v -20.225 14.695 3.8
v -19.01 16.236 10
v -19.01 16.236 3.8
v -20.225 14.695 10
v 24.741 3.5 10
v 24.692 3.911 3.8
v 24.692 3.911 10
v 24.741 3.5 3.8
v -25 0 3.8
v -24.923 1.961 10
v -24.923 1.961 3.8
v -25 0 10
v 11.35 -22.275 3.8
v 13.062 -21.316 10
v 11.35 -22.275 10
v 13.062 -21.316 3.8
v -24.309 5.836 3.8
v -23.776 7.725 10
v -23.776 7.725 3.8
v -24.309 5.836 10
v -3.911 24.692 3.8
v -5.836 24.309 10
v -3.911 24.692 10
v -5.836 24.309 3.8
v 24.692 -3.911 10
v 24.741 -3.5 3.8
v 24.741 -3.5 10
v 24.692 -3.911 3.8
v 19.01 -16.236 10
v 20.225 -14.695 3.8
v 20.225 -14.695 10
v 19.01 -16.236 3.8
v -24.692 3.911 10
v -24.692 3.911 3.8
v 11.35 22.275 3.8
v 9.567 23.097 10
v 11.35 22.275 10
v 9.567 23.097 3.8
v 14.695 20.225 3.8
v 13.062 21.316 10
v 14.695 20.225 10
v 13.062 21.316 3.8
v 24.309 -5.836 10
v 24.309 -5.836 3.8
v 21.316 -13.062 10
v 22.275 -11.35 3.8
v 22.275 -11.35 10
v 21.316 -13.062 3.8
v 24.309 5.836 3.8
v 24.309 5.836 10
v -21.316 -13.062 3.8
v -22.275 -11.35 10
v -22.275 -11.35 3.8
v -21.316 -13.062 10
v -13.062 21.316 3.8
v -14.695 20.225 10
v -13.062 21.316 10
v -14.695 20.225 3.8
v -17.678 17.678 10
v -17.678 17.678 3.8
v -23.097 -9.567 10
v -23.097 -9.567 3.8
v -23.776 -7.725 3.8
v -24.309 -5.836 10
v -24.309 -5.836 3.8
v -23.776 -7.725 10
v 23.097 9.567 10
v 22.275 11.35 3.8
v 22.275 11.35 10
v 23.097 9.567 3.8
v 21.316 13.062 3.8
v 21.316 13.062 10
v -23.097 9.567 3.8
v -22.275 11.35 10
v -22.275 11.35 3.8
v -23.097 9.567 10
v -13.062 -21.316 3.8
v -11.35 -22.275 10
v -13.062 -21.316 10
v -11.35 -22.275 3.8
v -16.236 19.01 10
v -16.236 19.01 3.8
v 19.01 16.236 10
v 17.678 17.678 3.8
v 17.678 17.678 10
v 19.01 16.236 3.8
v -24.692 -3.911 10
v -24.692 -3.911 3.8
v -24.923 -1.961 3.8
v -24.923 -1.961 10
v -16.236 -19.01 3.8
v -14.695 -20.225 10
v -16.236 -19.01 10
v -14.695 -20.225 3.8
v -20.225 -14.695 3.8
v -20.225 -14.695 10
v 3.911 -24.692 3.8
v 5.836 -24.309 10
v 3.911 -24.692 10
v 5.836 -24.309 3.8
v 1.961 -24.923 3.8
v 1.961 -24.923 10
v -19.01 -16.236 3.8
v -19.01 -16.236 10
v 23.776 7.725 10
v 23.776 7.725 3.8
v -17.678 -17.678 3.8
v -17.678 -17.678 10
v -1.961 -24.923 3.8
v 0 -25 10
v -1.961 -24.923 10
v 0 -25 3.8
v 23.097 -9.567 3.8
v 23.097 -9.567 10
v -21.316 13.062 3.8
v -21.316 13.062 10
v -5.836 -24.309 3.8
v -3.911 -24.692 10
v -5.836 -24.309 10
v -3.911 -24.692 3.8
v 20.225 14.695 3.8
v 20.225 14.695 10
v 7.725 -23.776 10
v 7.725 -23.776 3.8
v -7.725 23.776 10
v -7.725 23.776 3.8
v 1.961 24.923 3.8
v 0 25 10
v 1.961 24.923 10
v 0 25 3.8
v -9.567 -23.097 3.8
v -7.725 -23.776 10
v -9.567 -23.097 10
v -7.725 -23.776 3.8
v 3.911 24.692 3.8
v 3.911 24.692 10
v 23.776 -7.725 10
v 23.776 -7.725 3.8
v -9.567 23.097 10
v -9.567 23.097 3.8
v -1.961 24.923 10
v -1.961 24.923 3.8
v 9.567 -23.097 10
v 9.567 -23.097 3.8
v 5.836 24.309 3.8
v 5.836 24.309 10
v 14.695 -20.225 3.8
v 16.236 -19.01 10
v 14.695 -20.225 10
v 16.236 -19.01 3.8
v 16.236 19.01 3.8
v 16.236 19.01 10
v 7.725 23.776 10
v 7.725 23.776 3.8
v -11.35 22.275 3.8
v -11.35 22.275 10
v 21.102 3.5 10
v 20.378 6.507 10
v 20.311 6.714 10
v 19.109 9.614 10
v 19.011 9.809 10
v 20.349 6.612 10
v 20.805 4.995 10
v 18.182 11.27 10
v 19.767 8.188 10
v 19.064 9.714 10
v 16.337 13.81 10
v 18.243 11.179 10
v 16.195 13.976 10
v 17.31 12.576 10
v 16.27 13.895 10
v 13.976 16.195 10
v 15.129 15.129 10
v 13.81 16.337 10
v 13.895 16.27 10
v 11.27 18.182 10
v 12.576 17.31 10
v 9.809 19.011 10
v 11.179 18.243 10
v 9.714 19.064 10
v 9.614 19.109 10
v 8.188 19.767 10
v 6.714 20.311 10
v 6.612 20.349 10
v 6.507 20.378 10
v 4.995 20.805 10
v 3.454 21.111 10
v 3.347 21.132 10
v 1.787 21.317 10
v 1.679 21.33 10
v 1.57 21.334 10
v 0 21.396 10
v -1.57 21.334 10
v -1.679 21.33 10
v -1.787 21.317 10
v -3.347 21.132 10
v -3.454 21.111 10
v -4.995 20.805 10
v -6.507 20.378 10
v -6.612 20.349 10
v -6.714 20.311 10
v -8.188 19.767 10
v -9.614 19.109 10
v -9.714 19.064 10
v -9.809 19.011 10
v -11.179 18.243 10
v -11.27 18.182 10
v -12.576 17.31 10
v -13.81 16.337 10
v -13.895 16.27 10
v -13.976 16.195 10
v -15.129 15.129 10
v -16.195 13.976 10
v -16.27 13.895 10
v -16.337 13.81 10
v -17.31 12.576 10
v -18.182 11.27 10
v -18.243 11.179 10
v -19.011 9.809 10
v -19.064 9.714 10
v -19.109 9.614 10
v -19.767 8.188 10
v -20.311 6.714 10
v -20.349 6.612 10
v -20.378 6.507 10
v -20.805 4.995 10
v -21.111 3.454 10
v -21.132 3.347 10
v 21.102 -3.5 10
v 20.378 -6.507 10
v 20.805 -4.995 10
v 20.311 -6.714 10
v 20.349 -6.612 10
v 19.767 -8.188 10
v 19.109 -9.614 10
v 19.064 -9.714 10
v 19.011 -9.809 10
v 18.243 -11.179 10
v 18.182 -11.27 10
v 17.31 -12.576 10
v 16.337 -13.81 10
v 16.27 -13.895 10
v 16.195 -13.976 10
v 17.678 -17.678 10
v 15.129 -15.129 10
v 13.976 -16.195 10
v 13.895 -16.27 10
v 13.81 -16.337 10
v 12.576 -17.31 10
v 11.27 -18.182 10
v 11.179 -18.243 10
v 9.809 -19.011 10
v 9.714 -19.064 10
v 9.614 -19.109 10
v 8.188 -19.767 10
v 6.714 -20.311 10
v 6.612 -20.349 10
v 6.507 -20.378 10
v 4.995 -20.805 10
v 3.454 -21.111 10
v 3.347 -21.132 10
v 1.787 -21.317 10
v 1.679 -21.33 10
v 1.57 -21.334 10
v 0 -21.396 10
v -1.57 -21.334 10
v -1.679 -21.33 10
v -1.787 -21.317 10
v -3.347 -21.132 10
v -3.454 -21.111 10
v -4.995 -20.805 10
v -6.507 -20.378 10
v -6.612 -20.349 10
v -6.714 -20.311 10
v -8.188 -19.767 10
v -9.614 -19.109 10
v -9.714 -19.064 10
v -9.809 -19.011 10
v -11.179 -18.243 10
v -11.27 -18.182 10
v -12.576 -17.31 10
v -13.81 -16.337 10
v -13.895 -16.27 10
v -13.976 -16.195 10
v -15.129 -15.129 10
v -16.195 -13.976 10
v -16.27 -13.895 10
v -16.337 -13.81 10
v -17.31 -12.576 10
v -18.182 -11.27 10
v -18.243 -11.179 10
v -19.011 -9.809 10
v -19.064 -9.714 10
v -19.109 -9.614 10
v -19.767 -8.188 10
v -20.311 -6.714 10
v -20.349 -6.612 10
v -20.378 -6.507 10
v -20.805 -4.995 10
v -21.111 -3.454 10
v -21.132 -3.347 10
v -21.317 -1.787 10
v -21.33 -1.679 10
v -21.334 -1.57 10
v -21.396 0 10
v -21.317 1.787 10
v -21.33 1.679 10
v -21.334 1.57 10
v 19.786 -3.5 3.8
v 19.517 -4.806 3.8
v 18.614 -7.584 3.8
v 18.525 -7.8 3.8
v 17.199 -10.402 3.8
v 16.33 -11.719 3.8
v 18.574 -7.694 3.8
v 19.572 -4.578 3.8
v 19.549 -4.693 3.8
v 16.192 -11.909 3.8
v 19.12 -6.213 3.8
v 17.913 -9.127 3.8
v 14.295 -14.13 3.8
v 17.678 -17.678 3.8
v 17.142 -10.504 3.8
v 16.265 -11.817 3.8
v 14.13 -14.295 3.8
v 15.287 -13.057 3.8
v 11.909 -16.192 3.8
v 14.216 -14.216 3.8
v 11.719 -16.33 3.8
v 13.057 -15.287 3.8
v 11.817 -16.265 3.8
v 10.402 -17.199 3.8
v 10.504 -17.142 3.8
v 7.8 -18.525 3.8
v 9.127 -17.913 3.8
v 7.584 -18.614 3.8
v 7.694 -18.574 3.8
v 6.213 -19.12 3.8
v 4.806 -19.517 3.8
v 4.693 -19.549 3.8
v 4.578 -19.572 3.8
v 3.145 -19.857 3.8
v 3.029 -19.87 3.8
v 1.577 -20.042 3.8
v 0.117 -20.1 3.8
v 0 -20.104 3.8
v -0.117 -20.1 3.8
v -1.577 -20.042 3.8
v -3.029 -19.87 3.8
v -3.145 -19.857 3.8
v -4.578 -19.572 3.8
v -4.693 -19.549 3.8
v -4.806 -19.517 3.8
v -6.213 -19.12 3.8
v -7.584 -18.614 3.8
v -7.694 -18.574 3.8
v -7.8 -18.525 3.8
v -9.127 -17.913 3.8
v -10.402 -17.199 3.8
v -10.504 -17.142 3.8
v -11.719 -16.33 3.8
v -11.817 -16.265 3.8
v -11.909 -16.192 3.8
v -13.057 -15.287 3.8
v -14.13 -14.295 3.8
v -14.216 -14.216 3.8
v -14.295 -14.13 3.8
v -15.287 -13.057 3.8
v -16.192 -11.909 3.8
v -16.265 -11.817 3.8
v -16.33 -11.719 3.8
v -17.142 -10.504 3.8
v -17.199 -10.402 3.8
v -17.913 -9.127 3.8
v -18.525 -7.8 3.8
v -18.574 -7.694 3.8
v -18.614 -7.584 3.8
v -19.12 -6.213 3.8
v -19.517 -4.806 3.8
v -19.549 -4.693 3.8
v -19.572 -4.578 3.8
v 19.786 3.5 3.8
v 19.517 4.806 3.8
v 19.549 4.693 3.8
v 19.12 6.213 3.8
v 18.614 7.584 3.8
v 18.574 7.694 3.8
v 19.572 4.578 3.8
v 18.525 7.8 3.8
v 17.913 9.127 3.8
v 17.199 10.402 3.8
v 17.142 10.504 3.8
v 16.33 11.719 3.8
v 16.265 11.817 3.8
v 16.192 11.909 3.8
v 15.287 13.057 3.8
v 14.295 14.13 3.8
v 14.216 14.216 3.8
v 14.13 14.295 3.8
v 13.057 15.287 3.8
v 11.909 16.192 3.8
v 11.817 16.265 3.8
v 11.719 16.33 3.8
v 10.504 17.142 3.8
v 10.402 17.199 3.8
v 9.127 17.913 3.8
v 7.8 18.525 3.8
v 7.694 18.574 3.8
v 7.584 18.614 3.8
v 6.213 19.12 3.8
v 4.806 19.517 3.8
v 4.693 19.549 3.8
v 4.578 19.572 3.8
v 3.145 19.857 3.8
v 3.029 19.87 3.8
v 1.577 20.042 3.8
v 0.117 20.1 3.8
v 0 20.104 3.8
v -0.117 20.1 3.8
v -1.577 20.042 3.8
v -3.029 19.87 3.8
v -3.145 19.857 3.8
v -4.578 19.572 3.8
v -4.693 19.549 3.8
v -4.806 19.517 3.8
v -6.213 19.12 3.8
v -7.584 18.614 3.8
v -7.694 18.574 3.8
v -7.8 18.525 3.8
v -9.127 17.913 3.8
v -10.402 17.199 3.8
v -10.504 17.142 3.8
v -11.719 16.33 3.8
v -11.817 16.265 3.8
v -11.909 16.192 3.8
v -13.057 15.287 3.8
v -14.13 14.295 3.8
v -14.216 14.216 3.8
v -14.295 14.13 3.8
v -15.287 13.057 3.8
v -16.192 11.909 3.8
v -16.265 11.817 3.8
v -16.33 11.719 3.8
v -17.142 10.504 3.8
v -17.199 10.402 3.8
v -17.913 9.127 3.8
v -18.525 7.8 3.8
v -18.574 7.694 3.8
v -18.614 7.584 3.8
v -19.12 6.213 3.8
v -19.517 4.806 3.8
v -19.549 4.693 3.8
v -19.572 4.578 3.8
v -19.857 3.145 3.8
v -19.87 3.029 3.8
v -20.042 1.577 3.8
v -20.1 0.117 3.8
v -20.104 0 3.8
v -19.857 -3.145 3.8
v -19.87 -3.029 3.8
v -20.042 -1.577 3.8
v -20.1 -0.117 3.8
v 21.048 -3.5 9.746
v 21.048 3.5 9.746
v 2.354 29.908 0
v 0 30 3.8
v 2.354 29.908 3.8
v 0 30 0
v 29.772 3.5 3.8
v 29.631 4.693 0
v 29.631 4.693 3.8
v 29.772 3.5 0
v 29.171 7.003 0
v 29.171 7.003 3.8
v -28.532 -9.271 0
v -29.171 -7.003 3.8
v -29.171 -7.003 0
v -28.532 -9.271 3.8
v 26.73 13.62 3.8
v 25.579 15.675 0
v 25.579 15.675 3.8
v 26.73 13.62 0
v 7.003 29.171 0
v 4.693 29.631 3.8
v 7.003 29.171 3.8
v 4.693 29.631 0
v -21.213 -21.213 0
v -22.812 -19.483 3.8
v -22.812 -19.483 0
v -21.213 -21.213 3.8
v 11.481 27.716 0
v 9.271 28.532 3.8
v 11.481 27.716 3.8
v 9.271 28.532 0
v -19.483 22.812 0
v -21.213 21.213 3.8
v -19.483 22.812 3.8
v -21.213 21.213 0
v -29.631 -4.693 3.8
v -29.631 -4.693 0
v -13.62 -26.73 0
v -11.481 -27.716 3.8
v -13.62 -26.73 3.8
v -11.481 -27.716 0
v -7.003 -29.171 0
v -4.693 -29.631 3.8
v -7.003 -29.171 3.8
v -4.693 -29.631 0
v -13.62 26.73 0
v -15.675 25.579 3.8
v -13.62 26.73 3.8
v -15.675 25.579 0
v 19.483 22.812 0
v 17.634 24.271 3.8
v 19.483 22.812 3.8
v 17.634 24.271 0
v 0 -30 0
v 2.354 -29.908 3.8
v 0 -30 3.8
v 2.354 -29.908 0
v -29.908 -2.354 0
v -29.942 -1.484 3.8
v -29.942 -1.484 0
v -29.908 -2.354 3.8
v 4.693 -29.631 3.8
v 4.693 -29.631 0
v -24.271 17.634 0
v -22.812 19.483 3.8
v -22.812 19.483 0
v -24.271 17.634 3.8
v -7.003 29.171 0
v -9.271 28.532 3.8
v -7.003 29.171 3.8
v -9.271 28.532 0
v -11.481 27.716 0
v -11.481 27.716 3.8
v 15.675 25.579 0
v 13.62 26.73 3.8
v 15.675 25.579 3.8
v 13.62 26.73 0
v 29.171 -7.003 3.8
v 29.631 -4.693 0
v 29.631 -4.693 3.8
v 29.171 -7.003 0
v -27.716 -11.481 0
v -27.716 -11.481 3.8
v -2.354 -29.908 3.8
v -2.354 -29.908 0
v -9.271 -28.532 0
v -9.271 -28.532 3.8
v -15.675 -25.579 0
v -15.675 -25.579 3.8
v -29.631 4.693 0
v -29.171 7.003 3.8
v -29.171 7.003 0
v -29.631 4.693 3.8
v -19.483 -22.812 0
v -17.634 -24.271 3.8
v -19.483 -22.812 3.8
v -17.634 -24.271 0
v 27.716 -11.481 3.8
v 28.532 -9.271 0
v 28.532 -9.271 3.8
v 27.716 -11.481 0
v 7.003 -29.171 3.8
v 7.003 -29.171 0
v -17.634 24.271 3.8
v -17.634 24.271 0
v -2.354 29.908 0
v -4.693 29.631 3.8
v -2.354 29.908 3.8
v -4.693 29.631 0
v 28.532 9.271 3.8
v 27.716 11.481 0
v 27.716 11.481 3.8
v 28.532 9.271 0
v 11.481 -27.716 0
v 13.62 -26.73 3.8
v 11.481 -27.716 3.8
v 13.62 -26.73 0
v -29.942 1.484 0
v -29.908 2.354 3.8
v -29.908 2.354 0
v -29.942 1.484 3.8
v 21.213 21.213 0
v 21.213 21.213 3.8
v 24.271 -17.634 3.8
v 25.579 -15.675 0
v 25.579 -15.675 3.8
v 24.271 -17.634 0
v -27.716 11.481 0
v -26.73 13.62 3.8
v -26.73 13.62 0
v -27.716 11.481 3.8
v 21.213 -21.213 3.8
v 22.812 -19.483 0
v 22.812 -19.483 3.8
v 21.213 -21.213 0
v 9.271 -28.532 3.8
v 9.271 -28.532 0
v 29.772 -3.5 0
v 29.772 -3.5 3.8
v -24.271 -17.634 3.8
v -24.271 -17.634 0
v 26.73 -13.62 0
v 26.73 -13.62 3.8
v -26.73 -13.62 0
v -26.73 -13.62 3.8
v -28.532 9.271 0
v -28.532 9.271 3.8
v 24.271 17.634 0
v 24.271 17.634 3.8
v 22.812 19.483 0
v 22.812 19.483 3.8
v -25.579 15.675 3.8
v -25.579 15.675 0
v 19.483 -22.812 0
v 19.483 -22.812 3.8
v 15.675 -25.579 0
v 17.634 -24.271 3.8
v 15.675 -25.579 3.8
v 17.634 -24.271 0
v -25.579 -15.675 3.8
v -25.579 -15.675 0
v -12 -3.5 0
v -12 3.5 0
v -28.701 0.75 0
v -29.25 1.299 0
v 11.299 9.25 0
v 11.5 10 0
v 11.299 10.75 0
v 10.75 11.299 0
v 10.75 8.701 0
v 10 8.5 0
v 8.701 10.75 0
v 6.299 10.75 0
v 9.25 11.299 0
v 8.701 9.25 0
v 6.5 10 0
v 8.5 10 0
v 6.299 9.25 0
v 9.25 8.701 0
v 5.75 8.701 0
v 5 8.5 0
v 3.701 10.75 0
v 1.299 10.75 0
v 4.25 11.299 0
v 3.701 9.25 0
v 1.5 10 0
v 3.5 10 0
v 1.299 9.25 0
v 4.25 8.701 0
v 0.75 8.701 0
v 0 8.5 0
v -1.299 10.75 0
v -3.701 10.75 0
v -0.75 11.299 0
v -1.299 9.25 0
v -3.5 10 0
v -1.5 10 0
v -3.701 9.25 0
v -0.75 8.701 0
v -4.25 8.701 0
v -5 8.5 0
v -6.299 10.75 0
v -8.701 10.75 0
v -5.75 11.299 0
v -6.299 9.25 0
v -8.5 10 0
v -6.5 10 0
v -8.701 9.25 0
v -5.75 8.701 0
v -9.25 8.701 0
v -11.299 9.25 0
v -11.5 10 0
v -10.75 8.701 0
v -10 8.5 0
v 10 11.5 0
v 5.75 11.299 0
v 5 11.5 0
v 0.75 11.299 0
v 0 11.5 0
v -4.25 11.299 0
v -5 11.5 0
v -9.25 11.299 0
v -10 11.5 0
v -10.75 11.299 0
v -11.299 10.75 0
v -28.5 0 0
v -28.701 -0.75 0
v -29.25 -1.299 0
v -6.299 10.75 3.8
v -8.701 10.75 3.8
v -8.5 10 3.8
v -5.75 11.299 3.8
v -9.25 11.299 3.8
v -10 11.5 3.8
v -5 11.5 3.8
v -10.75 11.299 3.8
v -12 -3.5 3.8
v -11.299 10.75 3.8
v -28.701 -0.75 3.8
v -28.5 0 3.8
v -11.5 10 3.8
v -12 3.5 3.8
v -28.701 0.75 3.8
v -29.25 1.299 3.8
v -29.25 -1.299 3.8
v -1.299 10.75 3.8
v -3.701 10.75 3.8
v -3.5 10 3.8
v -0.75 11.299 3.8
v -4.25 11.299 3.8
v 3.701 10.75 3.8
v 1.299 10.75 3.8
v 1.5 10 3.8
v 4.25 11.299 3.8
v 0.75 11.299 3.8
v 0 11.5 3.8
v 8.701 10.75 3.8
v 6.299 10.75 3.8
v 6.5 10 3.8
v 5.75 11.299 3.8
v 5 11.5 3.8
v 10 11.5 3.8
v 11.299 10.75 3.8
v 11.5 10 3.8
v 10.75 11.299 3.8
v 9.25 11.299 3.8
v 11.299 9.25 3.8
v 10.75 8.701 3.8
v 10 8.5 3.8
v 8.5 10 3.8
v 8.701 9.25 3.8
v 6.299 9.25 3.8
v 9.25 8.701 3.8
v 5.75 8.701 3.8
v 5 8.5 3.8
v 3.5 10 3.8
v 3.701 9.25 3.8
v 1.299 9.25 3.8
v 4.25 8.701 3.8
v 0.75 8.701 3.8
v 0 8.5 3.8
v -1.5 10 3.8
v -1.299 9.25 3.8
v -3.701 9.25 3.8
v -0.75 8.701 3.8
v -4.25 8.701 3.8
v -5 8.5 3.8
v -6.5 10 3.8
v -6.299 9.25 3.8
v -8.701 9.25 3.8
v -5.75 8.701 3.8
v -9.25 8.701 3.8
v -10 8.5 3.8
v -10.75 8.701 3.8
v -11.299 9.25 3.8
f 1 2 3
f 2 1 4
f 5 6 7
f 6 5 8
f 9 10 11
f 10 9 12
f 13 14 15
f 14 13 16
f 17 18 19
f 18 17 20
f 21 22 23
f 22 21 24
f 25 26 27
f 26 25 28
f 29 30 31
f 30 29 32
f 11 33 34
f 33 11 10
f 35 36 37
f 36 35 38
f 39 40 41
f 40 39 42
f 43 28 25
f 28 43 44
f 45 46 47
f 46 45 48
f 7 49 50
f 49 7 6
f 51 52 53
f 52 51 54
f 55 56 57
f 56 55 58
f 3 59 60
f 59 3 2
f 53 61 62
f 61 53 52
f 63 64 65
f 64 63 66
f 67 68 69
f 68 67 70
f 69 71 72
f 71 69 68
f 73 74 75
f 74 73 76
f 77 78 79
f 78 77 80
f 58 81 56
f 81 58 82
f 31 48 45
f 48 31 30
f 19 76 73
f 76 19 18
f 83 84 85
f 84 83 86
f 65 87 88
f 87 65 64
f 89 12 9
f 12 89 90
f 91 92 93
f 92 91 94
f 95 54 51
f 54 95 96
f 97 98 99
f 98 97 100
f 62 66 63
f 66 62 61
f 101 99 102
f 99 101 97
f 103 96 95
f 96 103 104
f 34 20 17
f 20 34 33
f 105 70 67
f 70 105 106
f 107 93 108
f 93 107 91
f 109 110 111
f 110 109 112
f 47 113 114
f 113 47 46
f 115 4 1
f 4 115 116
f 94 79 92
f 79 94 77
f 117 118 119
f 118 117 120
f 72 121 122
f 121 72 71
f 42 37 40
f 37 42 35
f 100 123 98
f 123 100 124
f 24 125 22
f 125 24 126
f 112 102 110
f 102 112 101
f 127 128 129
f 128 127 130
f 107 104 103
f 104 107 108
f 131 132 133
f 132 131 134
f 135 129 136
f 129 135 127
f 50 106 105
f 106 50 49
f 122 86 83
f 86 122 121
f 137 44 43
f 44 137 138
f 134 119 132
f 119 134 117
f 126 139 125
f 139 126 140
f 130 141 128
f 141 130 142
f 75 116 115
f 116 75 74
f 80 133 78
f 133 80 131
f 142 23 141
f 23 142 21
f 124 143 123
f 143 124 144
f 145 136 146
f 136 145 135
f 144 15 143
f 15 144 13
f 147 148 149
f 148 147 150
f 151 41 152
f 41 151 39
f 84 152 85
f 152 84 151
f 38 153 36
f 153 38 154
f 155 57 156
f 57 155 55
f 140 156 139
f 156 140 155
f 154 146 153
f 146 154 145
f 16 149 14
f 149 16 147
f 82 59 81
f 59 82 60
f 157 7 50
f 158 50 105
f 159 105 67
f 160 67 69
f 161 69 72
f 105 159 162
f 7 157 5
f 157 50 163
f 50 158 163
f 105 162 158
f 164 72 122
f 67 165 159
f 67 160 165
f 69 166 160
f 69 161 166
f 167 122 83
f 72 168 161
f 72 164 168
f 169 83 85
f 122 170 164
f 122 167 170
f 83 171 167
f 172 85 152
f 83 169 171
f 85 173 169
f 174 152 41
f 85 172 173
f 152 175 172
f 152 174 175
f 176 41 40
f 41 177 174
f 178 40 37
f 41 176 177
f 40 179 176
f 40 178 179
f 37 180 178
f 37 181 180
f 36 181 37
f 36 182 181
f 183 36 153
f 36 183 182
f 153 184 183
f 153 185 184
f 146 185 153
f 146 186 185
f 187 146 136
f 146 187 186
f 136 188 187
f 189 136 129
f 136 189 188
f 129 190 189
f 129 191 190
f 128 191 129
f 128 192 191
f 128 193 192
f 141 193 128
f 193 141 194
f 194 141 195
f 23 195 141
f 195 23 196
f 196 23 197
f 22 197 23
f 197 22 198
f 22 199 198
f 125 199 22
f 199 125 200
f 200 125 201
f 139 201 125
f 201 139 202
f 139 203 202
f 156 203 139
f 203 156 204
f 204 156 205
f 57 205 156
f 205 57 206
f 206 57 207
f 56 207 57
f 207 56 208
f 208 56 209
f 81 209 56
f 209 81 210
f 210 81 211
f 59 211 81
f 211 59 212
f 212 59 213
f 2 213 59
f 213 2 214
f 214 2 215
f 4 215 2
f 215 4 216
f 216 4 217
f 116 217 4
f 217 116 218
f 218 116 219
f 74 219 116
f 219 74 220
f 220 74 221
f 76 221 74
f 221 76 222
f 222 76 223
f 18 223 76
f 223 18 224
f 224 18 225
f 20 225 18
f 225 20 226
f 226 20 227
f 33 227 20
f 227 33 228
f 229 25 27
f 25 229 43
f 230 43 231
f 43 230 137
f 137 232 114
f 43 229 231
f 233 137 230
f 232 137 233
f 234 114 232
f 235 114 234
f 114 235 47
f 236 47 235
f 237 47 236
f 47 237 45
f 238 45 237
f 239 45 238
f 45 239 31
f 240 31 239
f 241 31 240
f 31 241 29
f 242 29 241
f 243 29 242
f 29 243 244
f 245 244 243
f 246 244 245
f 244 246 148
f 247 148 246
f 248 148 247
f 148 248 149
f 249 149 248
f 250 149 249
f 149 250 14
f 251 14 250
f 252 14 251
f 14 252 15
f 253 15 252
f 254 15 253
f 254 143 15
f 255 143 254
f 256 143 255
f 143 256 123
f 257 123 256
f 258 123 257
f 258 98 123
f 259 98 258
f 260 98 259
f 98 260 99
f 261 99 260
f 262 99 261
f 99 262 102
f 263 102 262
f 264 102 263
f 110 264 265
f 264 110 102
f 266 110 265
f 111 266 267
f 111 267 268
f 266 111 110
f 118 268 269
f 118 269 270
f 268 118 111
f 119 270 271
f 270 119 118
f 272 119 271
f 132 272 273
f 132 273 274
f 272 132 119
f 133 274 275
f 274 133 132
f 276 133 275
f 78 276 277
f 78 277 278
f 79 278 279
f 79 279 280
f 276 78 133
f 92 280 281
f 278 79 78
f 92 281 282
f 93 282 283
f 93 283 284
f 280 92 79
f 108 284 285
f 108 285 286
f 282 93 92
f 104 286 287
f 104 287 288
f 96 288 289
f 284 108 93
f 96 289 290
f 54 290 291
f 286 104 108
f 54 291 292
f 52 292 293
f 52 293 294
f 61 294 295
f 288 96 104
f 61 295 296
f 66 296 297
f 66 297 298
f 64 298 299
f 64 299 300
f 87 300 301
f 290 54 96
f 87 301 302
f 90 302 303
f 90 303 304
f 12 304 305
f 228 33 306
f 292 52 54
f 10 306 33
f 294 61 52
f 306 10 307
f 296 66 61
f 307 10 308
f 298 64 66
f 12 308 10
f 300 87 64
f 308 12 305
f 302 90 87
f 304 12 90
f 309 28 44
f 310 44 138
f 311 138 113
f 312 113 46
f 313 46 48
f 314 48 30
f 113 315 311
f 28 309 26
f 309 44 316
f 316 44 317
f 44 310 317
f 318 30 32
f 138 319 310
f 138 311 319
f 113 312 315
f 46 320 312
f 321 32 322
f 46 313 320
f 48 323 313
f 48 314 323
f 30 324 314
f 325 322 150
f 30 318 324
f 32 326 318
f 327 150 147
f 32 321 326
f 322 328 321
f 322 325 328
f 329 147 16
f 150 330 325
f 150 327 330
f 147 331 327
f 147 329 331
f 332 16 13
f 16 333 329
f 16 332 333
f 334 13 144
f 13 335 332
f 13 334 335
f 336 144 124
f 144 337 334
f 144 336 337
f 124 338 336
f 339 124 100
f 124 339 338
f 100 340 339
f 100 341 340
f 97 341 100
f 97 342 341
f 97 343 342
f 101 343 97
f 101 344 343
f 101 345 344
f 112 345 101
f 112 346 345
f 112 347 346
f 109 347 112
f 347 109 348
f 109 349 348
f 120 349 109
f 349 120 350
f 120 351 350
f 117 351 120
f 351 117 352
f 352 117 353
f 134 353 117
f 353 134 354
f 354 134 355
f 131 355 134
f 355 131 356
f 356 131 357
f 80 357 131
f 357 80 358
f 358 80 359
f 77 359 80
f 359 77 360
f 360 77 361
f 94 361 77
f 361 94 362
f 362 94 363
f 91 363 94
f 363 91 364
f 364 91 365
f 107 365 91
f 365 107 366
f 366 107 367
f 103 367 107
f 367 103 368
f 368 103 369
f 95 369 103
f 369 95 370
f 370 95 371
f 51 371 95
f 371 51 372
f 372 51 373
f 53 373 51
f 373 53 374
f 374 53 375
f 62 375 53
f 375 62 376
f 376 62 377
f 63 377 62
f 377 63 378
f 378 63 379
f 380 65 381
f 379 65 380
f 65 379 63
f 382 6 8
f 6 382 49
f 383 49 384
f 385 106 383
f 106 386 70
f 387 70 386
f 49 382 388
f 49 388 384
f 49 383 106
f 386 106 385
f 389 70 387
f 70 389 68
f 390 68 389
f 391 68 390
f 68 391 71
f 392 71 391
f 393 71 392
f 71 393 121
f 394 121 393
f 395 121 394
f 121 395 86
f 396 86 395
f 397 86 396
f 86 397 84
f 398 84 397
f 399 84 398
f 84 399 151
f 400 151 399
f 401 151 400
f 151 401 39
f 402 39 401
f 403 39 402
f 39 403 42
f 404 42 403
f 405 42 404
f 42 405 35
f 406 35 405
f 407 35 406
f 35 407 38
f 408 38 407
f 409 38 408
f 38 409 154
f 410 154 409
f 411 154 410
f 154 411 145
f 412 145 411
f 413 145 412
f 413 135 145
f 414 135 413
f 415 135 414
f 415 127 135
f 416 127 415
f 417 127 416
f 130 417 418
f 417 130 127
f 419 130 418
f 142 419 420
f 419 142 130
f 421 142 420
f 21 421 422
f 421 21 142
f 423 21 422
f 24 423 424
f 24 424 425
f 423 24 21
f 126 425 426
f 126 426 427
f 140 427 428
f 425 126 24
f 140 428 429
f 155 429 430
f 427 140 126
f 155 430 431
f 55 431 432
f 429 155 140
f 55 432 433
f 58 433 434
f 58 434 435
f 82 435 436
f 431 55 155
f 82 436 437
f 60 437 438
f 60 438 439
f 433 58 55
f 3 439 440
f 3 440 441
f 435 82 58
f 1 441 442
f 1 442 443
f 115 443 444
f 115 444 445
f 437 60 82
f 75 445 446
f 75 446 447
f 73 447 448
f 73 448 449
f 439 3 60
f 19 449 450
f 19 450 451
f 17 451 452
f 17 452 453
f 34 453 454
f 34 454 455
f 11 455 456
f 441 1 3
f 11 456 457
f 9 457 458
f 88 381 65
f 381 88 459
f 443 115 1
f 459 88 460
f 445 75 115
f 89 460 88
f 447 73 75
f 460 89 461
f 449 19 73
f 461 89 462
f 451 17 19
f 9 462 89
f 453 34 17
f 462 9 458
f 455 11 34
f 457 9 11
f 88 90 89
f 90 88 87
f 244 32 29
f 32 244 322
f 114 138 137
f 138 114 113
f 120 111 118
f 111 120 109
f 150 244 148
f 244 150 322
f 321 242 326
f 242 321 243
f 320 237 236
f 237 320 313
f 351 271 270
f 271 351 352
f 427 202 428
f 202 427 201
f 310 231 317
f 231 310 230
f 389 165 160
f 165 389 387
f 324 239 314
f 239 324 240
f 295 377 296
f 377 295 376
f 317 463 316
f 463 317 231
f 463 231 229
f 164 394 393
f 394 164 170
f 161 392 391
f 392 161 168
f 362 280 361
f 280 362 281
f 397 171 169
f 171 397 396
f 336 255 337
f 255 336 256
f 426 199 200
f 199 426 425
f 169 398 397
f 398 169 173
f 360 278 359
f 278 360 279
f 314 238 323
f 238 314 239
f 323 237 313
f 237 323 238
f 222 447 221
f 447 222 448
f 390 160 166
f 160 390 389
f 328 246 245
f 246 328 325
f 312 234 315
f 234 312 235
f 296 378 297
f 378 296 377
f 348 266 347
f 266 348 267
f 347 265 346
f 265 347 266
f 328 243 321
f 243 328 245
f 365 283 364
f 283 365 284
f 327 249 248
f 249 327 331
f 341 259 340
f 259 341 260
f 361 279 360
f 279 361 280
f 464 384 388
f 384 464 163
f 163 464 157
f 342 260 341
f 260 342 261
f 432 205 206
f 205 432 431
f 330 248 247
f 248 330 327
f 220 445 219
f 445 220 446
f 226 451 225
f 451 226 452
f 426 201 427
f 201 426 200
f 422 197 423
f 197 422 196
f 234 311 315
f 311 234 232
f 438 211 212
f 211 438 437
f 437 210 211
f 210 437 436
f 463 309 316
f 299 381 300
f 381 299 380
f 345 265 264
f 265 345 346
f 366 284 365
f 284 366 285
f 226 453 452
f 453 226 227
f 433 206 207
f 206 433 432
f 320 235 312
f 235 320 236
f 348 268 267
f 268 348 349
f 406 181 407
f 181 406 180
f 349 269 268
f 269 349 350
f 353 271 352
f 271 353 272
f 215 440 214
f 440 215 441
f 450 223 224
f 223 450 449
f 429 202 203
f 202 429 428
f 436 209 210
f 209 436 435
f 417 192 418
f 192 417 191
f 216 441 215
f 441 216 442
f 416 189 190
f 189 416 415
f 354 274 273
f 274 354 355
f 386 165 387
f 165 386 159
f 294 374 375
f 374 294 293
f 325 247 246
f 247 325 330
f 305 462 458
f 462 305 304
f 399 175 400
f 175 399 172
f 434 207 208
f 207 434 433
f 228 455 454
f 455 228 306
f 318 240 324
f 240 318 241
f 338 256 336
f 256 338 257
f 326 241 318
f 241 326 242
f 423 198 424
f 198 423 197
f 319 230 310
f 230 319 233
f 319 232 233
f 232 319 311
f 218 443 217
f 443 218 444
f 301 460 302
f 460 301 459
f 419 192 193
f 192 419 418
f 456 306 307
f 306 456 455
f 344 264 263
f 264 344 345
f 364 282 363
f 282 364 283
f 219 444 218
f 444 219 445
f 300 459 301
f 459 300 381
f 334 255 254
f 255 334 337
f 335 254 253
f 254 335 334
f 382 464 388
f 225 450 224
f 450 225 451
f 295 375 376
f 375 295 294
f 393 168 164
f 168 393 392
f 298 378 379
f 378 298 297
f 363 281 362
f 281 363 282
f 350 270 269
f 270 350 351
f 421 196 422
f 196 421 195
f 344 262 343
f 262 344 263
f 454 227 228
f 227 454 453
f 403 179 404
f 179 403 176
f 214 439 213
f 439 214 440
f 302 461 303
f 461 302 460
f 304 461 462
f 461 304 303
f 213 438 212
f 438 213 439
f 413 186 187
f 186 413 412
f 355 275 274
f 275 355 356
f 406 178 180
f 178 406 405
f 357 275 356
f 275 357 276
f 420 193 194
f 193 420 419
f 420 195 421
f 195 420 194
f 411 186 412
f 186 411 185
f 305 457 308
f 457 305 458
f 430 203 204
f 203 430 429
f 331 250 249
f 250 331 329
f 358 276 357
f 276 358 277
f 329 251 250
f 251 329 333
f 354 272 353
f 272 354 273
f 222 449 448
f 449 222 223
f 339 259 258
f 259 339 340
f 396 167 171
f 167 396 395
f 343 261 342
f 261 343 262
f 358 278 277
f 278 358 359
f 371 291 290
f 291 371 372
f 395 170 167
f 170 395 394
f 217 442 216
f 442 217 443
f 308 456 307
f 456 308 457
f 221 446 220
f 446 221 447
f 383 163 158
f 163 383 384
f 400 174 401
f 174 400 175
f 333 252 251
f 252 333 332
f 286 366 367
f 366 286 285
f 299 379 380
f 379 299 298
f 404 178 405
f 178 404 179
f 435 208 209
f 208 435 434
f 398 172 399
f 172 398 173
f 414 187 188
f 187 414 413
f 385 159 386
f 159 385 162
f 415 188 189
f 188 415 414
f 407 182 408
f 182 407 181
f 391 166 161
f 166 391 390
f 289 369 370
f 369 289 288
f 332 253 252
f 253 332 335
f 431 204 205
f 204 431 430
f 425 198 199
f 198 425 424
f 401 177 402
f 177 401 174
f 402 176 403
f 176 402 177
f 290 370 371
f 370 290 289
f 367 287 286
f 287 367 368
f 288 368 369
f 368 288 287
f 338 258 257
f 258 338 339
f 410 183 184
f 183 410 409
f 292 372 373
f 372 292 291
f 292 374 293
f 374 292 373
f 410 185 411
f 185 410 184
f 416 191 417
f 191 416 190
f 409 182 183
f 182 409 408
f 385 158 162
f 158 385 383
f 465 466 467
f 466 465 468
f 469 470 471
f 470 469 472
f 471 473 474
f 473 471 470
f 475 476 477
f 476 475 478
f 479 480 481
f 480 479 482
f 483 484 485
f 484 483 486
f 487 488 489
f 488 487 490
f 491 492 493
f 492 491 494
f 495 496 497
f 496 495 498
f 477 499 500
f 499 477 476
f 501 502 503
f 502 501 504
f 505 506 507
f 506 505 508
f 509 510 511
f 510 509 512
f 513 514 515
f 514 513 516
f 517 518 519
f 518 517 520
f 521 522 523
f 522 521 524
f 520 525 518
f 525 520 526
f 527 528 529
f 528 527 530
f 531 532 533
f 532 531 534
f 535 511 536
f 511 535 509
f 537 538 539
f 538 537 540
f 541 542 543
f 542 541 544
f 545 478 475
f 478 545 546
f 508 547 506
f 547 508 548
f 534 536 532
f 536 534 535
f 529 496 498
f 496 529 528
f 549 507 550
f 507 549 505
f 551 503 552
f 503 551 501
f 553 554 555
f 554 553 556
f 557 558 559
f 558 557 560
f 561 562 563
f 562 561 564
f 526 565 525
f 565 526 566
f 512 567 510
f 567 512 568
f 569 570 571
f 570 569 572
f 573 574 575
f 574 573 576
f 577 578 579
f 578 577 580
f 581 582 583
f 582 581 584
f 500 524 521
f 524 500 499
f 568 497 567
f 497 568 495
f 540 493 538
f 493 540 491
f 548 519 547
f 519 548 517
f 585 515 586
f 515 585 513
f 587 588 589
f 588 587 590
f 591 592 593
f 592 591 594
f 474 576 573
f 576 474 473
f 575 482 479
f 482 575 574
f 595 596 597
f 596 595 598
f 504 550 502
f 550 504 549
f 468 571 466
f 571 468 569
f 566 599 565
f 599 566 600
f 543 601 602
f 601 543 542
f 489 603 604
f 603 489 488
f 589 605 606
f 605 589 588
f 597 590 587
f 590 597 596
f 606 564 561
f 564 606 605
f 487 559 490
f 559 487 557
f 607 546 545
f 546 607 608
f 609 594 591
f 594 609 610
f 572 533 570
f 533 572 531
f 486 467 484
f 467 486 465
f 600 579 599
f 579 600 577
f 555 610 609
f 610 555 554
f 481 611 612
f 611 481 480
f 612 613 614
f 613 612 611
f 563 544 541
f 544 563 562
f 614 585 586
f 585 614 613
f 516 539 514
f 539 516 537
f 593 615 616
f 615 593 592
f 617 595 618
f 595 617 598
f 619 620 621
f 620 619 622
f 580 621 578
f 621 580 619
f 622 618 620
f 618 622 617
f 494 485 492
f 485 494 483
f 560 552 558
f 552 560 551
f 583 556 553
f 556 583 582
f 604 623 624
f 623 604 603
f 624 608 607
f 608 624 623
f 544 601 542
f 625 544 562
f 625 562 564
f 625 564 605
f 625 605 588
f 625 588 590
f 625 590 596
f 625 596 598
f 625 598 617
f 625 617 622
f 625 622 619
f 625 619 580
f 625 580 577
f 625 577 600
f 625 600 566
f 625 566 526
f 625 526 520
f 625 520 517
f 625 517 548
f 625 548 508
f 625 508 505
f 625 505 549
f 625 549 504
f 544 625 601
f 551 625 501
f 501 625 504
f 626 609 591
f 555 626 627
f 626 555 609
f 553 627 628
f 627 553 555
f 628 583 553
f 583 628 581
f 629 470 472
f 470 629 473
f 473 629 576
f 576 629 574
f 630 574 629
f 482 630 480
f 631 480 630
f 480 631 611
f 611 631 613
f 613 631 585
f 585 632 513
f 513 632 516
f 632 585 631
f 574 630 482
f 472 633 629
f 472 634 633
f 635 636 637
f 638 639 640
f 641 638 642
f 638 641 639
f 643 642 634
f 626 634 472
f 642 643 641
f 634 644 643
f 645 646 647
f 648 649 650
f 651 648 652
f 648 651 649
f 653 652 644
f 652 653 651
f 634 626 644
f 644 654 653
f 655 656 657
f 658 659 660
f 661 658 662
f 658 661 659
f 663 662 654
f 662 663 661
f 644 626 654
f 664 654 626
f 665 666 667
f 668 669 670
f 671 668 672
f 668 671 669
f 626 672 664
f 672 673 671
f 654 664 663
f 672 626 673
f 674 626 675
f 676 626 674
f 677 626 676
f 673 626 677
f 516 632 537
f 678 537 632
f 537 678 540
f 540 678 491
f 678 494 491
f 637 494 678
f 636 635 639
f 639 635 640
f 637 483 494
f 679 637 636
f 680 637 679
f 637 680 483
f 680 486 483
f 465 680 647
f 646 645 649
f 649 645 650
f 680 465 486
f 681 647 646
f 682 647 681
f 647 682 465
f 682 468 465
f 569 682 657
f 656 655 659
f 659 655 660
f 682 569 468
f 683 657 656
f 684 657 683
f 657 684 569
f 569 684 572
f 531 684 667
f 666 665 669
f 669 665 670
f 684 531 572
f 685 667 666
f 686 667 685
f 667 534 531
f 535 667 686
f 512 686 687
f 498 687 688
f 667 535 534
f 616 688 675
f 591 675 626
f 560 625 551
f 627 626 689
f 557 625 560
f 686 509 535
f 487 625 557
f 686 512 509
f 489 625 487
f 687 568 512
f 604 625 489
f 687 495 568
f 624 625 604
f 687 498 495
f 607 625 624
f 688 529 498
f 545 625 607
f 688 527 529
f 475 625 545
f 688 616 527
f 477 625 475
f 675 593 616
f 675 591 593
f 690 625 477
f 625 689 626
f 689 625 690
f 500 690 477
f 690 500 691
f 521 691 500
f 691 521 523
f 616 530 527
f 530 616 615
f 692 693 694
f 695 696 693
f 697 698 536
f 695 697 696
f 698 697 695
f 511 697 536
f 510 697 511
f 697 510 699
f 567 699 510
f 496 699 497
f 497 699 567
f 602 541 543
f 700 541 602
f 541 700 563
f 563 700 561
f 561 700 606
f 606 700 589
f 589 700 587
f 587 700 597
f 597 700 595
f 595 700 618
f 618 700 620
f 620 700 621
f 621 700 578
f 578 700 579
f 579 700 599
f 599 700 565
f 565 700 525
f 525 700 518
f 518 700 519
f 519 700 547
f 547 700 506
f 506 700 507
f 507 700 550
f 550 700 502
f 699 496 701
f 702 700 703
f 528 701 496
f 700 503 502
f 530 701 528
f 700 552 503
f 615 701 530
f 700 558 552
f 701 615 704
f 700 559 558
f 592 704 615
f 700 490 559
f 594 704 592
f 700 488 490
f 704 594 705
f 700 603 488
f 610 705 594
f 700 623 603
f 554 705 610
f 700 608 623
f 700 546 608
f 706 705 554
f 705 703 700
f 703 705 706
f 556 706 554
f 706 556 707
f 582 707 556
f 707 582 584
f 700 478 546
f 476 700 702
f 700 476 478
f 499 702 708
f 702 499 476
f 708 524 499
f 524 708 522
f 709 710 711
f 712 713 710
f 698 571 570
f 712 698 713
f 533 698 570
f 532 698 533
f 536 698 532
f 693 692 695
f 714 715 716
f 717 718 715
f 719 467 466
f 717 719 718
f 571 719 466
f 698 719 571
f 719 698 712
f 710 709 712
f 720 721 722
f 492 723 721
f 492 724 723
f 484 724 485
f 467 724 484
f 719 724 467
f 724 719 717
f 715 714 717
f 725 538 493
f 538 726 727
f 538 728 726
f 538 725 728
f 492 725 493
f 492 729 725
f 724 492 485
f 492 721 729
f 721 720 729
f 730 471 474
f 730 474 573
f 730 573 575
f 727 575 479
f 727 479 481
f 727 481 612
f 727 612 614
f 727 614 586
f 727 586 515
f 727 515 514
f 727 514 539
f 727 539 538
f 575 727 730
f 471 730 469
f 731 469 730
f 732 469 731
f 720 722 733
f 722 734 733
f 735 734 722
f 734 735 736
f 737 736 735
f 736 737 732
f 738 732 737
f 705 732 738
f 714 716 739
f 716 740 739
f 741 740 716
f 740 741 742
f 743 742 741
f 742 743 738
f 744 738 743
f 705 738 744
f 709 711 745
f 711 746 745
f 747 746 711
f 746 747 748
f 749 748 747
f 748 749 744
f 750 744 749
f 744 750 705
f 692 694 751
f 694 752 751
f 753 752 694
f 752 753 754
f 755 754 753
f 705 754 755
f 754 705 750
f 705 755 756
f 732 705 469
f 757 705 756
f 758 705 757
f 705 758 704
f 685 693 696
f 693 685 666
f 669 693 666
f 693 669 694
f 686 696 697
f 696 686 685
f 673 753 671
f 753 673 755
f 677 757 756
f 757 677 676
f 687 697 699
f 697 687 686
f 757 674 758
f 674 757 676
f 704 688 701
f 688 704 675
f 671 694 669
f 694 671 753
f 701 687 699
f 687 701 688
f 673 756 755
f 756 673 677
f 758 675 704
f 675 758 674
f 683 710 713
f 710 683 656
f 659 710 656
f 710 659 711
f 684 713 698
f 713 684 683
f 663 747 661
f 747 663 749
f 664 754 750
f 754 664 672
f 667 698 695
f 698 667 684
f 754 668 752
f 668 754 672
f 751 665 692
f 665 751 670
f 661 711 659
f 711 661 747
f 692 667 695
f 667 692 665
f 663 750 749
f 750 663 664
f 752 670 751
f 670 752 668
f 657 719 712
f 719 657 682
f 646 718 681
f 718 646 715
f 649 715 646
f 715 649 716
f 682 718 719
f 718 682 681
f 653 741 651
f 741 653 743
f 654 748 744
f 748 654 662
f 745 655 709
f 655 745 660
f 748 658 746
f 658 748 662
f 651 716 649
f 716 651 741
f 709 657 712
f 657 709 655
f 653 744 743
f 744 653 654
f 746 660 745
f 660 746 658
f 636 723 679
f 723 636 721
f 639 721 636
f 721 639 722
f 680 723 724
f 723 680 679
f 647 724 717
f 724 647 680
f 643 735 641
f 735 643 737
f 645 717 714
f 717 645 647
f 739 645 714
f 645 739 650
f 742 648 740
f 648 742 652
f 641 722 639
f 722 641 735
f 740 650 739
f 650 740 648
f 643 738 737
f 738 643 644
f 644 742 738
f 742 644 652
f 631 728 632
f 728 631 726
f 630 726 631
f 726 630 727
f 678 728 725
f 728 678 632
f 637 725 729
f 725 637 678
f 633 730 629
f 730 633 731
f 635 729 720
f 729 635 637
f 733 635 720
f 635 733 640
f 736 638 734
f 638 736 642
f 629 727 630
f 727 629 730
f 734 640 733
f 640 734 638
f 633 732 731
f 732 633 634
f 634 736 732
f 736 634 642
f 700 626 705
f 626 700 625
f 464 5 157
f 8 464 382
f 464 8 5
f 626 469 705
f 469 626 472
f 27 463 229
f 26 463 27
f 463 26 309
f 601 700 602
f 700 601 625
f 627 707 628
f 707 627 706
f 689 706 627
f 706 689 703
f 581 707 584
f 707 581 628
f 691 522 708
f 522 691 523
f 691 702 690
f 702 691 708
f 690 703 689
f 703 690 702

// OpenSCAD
$fn=80;
module example001()
{
	difference()
	{
	base();
	slot();
    locate();
	vents();
	}	
}

module vents()
{
	for( y = [ - 10 : 5 : 10 ] )
	{
	translate([y,10,0])
		cylinder(15,1.5,1.5,$fn=12,center=true);
	}
}
module slot()
{
	m = (60 - 42) / 2;
	translate([m,0,0])
		cube(size=[42,7,25],center=true);


}
module locate()
{
	translate([-60/2,0,0])
		cylinder(12,1.5,1.5,$fn=12,center=true);
}
module base()
{
    union()
    {
	cylinder(3.8, 60/2,60/2 );
	translate([0,0,3.8+(10-3.8)/2])
	difference() {
		cylinder(10-3.8,50/2,50/2,center=true);
		cylinder(10-3.8+1,40/2,43/2,center=true);		 //+1 to make it bigger
    }
    }
}
example001();
